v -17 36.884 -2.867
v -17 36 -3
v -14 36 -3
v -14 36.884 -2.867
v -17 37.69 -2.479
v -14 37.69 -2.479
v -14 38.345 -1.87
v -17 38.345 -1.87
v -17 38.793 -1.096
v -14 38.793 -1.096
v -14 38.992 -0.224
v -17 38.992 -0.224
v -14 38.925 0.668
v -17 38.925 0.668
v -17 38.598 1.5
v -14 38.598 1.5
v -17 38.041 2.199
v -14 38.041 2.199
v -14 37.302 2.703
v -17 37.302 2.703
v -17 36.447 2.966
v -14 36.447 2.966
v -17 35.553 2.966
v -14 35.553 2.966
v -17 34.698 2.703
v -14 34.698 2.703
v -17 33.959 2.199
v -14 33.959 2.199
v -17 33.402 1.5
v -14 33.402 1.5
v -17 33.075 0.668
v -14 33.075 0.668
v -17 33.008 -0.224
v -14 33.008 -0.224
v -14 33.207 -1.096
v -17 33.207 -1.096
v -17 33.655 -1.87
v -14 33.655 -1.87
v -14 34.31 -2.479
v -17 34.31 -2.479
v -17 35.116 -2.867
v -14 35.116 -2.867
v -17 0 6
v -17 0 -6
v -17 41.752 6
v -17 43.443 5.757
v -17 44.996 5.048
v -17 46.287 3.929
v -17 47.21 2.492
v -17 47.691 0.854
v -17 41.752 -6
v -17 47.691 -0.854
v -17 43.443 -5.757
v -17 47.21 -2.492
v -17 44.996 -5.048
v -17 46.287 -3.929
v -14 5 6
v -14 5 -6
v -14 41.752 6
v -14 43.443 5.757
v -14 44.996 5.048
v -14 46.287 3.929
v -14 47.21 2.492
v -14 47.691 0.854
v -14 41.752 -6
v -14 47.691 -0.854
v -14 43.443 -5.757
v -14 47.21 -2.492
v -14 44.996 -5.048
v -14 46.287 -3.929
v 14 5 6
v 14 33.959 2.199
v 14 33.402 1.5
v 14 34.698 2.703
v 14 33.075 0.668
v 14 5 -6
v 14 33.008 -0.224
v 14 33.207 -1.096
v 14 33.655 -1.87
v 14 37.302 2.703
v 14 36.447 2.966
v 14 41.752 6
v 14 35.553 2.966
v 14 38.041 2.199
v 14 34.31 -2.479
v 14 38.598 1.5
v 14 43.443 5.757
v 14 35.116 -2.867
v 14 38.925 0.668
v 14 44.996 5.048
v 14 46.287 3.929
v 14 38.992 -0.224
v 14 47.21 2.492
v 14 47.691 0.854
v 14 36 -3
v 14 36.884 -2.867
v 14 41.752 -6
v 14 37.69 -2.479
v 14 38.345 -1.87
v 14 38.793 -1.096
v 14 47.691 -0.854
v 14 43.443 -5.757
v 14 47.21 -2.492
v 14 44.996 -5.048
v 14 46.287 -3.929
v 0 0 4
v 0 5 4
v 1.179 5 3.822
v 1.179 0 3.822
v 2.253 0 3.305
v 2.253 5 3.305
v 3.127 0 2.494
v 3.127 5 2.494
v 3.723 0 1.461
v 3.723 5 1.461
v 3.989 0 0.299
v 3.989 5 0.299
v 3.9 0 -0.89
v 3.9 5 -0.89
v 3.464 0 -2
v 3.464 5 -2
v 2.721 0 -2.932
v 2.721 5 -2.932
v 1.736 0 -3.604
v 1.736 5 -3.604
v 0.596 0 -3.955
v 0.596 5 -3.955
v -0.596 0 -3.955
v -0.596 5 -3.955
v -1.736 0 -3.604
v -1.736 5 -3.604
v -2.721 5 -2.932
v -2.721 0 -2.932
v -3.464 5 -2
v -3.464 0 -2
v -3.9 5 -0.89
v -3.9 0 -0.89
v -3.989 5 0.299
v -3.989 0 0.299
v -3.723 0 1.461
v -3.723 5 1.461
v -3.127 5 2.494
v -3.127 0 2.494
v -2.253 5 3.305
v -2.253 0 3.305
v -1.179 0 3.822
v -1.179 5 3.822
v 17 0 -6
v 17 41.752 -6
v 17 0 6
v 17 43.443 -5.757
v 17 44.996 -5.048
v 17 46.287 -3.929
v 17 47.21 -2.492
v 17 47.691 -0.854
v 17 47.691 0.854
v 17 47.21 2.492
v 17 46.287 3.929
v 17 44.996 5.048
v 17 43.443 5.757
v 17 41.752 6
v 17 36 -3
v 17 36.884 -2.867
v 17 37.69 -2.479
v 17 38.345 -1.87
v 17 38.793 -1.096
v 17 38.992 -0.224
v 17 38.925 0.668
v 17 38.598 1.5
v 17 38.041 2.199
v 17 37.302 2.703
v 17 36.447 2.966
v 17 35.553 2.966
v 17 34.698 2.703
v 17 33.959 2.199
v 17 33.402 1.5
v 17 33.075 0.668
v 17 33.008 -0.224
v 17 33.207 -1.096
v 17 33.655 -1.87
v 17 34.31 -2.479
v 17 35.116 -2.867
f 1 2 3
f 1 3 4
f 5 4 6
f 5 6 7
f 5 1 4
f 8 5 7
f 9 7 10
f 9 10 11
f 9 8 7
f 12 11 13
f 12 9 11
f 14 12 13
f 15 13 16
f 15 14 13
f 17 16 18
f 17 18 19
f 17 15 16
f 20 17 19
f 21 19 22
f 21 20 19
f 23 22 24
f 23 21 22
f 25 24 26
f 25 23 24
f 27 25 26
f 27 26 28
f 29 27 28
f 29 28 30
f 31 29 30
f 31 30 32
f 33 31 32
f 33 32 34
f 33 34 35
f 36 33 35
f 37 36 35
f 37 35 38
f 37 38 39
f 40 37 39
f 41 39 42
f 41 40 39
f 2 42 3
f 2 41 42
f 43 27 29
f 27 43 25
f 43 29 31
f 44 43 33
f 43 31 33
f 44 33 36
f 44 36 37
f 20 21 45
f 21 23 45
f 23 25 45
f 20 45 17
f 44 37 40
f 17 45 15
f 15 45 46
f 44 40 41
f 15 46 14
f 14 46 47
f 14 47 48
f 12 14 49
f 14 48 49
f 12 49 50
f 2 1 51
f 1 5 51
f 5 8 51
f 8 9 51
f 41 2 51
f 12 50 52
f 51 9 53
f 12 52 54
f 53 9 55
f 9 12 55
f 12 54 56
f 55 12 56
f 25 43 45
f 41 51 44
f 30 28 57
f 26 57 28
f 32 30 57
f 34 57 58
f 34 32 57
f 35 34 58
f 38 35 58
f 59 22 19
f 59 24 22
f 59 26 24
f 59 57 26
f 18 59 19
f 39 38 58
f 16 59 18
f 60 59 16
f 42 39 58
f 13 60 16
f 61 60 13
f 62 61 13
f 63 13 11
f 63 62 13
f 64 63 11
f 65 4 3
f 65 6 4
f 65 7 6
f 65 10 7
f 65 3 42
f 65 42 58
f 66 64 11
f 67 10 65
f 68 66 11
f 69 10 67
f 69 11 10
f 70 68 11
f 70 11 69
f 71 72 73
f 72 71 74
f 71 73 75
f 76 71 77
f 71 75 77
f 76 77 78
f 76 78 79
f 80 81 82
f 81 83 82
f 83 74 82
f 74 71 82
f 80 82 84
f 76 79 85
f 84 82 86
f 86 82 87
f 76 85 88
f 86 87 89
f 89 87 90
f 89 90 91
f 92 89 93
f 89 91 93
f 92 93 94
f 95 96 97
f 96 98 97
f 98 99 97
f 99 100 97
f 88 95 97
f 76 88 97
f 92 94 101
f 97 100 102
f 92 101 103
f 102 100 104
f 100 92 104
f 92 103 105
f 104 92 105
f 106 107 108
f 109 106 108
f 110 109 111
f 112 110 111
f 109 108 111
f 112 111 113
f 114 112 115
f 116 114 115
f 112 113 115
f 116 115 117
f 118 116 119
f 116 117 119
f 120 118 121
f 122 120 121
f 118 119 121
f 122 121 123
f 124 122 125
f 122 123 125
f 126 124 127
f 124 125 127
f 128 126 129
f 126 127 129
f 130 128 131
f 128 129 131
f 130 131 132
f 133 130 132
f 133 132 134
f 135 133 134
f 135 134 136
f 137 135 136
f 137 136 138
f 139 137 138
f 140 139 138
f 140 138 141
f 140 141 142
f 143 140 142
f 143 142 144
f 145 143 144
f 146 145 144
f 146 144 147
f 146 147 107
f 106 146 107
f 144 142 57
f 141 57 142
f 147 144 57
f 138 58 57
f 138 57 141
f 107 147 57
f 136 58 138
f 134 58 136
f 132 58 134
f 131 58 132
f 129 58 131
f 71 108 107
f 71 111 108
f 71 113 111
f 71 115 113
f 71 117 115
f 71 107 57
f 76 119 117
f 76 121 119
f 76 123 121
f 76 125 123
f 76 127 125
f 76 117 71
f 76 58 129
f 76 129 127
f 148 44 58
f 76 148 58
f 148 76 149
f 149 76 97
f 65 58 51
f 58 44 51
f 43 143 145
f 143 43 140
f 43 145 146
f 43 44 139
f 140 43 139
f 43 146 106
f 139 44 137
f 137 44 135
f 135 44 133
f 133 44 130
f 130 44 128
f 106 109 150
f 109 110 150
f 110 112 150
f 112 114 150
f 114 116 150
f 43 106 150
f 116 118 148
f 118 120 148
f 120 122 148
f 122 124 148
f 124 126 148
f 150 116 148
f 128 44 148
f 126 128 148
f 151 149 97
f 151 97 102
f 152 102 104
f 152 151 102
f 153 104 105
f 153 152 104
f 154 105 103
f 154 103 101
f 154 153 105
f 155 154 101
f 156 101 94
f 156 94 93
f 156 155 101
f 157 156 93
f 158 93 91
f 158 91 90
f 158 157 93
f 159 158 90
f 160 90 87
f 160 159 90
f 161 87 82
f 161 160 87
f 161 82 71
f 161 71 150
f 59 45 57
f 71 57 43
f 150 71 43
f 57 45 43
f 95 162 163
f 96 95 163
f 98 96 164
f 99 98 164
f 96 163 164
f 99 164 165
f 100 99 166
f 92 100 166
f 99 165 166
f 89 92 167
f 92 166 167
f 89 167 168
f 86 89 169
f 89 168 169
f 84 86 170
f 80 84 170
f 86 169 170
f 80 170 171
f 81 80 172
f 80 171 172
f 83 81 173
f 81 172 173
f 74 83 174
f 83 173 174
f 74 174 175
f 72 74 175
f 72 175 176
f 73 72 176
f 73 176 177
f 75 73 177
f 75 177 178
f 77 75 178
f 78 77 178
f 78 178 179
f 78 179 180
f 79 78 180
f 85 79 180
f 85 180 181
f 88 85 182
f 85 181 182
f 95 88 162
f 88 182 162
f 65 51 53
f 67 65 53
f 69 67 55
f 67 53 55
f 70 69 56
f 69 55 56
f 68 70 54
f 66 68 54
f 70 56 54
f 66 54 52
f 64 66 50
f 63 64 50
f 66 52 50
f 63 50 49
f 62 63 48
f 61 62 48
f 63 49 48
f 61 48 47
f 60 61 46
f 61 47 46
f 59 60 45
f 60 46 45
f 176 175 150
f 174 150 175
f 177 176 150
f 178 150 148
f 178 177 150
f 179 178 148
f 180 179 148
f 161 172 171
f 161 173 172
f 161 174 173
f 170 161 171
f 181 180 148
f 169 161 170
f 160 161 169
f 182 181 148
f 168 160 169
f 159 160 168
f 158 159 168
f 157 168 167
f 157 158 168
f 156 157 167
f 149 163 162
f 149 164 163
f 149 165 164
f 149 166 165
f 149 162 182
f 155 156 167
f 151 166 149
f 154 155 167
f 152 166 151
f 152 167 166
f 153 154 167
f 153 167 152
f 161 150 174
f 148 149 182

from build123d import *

# Parameters (mm, degrees)
SKETCH1_W           = 34
SKETCH1_H           = 12
BOSS_EXTRUDE1_DEPTH = 5
SKETCH5_R           = 3
BOSS_EXTRUDE3_DEPTH = 3
SKETCH6_R           = 1.5
CUT_EXTRUDE1_DEPTH  = 3
SKETCH8_R           = 4
CUT_EXTRUDE4_DEPTH  = 47.397777415


with BuildPart() as part:
    # Sketch1 → Boss-Extrude1 (new body)
    with BuildSketch(Plane(origin=(0, 0, 0), x_dir=(1, 0, 0), z_dir=(0, 1, 0))):
        Rectangle(SKETCH1_W, SKETCH1_H)
    extrude(amount=BOSS_EXTRUDE1_DEPTH)

    # Sketch5 → Boss-Extrude3 (add)
    with BuildSketch(Plane(origin=(17, 0, 0), x_dir=(0, 0, -1), z_dir=(1, 0, 0))):
        with BuildLine():
            Line((-6, 5), (6, 5))
            Line((6, 5), (6, 36))
            Line((6, 36), (6, 41.752236772))
            ThreePointArc((6, 41.752236772), (0, 47.752236772), (-6, 41.752236772))
            Line((-6, 41.752236772), (-6, 36))
            Line((-6, 36), (-6, 5))
        make_face()
        with Locations((0, 36)):
            Circle(SKETCH5_R, mode=Mode.SUBTRACT)
    boss_extrude3 = extrude(amount=-BOSS_EXTRUDE3_DEPTH)

    # Sketch6 → Cut-Extrude1 (cut)
    with BuildSketch(Plane(origin=(0, 5, 0), x_dir=(1, 0, 0), z_dir=(0, 1, 0))):
        with Locations(Location((0, 0, 0), (0, 0, 270))):
            Circle(SKETCH6_R)
    extrude(amount=-CUT_EXTRUDE1_DEPTH, mode=Mode.SUBTRACT)

    # Sketch8 → Cut-Extrude4 (cut, through all)
    with BuildSketch(Plane(origin=(0, 5, 0), x_dir=(1, 0, 0), z_dir=(0, 1, 0))):
        with Locations(Location((0, 0, 0), (0, 0, 270))):
            Circle(SKETCH8_R)
    extrude(amount=-CUT_EXTRUDE4_DEPTH, mode=Mode.SUBTRACT)

    # Mirror1: Boss-Extrude3 across plane
    add(boss_extrude3.mirror(Plane(origin=(0, 0, 0), x_dir=(0, 0, 1), z_dir=(1, 0, 0))))


solid = part.part
